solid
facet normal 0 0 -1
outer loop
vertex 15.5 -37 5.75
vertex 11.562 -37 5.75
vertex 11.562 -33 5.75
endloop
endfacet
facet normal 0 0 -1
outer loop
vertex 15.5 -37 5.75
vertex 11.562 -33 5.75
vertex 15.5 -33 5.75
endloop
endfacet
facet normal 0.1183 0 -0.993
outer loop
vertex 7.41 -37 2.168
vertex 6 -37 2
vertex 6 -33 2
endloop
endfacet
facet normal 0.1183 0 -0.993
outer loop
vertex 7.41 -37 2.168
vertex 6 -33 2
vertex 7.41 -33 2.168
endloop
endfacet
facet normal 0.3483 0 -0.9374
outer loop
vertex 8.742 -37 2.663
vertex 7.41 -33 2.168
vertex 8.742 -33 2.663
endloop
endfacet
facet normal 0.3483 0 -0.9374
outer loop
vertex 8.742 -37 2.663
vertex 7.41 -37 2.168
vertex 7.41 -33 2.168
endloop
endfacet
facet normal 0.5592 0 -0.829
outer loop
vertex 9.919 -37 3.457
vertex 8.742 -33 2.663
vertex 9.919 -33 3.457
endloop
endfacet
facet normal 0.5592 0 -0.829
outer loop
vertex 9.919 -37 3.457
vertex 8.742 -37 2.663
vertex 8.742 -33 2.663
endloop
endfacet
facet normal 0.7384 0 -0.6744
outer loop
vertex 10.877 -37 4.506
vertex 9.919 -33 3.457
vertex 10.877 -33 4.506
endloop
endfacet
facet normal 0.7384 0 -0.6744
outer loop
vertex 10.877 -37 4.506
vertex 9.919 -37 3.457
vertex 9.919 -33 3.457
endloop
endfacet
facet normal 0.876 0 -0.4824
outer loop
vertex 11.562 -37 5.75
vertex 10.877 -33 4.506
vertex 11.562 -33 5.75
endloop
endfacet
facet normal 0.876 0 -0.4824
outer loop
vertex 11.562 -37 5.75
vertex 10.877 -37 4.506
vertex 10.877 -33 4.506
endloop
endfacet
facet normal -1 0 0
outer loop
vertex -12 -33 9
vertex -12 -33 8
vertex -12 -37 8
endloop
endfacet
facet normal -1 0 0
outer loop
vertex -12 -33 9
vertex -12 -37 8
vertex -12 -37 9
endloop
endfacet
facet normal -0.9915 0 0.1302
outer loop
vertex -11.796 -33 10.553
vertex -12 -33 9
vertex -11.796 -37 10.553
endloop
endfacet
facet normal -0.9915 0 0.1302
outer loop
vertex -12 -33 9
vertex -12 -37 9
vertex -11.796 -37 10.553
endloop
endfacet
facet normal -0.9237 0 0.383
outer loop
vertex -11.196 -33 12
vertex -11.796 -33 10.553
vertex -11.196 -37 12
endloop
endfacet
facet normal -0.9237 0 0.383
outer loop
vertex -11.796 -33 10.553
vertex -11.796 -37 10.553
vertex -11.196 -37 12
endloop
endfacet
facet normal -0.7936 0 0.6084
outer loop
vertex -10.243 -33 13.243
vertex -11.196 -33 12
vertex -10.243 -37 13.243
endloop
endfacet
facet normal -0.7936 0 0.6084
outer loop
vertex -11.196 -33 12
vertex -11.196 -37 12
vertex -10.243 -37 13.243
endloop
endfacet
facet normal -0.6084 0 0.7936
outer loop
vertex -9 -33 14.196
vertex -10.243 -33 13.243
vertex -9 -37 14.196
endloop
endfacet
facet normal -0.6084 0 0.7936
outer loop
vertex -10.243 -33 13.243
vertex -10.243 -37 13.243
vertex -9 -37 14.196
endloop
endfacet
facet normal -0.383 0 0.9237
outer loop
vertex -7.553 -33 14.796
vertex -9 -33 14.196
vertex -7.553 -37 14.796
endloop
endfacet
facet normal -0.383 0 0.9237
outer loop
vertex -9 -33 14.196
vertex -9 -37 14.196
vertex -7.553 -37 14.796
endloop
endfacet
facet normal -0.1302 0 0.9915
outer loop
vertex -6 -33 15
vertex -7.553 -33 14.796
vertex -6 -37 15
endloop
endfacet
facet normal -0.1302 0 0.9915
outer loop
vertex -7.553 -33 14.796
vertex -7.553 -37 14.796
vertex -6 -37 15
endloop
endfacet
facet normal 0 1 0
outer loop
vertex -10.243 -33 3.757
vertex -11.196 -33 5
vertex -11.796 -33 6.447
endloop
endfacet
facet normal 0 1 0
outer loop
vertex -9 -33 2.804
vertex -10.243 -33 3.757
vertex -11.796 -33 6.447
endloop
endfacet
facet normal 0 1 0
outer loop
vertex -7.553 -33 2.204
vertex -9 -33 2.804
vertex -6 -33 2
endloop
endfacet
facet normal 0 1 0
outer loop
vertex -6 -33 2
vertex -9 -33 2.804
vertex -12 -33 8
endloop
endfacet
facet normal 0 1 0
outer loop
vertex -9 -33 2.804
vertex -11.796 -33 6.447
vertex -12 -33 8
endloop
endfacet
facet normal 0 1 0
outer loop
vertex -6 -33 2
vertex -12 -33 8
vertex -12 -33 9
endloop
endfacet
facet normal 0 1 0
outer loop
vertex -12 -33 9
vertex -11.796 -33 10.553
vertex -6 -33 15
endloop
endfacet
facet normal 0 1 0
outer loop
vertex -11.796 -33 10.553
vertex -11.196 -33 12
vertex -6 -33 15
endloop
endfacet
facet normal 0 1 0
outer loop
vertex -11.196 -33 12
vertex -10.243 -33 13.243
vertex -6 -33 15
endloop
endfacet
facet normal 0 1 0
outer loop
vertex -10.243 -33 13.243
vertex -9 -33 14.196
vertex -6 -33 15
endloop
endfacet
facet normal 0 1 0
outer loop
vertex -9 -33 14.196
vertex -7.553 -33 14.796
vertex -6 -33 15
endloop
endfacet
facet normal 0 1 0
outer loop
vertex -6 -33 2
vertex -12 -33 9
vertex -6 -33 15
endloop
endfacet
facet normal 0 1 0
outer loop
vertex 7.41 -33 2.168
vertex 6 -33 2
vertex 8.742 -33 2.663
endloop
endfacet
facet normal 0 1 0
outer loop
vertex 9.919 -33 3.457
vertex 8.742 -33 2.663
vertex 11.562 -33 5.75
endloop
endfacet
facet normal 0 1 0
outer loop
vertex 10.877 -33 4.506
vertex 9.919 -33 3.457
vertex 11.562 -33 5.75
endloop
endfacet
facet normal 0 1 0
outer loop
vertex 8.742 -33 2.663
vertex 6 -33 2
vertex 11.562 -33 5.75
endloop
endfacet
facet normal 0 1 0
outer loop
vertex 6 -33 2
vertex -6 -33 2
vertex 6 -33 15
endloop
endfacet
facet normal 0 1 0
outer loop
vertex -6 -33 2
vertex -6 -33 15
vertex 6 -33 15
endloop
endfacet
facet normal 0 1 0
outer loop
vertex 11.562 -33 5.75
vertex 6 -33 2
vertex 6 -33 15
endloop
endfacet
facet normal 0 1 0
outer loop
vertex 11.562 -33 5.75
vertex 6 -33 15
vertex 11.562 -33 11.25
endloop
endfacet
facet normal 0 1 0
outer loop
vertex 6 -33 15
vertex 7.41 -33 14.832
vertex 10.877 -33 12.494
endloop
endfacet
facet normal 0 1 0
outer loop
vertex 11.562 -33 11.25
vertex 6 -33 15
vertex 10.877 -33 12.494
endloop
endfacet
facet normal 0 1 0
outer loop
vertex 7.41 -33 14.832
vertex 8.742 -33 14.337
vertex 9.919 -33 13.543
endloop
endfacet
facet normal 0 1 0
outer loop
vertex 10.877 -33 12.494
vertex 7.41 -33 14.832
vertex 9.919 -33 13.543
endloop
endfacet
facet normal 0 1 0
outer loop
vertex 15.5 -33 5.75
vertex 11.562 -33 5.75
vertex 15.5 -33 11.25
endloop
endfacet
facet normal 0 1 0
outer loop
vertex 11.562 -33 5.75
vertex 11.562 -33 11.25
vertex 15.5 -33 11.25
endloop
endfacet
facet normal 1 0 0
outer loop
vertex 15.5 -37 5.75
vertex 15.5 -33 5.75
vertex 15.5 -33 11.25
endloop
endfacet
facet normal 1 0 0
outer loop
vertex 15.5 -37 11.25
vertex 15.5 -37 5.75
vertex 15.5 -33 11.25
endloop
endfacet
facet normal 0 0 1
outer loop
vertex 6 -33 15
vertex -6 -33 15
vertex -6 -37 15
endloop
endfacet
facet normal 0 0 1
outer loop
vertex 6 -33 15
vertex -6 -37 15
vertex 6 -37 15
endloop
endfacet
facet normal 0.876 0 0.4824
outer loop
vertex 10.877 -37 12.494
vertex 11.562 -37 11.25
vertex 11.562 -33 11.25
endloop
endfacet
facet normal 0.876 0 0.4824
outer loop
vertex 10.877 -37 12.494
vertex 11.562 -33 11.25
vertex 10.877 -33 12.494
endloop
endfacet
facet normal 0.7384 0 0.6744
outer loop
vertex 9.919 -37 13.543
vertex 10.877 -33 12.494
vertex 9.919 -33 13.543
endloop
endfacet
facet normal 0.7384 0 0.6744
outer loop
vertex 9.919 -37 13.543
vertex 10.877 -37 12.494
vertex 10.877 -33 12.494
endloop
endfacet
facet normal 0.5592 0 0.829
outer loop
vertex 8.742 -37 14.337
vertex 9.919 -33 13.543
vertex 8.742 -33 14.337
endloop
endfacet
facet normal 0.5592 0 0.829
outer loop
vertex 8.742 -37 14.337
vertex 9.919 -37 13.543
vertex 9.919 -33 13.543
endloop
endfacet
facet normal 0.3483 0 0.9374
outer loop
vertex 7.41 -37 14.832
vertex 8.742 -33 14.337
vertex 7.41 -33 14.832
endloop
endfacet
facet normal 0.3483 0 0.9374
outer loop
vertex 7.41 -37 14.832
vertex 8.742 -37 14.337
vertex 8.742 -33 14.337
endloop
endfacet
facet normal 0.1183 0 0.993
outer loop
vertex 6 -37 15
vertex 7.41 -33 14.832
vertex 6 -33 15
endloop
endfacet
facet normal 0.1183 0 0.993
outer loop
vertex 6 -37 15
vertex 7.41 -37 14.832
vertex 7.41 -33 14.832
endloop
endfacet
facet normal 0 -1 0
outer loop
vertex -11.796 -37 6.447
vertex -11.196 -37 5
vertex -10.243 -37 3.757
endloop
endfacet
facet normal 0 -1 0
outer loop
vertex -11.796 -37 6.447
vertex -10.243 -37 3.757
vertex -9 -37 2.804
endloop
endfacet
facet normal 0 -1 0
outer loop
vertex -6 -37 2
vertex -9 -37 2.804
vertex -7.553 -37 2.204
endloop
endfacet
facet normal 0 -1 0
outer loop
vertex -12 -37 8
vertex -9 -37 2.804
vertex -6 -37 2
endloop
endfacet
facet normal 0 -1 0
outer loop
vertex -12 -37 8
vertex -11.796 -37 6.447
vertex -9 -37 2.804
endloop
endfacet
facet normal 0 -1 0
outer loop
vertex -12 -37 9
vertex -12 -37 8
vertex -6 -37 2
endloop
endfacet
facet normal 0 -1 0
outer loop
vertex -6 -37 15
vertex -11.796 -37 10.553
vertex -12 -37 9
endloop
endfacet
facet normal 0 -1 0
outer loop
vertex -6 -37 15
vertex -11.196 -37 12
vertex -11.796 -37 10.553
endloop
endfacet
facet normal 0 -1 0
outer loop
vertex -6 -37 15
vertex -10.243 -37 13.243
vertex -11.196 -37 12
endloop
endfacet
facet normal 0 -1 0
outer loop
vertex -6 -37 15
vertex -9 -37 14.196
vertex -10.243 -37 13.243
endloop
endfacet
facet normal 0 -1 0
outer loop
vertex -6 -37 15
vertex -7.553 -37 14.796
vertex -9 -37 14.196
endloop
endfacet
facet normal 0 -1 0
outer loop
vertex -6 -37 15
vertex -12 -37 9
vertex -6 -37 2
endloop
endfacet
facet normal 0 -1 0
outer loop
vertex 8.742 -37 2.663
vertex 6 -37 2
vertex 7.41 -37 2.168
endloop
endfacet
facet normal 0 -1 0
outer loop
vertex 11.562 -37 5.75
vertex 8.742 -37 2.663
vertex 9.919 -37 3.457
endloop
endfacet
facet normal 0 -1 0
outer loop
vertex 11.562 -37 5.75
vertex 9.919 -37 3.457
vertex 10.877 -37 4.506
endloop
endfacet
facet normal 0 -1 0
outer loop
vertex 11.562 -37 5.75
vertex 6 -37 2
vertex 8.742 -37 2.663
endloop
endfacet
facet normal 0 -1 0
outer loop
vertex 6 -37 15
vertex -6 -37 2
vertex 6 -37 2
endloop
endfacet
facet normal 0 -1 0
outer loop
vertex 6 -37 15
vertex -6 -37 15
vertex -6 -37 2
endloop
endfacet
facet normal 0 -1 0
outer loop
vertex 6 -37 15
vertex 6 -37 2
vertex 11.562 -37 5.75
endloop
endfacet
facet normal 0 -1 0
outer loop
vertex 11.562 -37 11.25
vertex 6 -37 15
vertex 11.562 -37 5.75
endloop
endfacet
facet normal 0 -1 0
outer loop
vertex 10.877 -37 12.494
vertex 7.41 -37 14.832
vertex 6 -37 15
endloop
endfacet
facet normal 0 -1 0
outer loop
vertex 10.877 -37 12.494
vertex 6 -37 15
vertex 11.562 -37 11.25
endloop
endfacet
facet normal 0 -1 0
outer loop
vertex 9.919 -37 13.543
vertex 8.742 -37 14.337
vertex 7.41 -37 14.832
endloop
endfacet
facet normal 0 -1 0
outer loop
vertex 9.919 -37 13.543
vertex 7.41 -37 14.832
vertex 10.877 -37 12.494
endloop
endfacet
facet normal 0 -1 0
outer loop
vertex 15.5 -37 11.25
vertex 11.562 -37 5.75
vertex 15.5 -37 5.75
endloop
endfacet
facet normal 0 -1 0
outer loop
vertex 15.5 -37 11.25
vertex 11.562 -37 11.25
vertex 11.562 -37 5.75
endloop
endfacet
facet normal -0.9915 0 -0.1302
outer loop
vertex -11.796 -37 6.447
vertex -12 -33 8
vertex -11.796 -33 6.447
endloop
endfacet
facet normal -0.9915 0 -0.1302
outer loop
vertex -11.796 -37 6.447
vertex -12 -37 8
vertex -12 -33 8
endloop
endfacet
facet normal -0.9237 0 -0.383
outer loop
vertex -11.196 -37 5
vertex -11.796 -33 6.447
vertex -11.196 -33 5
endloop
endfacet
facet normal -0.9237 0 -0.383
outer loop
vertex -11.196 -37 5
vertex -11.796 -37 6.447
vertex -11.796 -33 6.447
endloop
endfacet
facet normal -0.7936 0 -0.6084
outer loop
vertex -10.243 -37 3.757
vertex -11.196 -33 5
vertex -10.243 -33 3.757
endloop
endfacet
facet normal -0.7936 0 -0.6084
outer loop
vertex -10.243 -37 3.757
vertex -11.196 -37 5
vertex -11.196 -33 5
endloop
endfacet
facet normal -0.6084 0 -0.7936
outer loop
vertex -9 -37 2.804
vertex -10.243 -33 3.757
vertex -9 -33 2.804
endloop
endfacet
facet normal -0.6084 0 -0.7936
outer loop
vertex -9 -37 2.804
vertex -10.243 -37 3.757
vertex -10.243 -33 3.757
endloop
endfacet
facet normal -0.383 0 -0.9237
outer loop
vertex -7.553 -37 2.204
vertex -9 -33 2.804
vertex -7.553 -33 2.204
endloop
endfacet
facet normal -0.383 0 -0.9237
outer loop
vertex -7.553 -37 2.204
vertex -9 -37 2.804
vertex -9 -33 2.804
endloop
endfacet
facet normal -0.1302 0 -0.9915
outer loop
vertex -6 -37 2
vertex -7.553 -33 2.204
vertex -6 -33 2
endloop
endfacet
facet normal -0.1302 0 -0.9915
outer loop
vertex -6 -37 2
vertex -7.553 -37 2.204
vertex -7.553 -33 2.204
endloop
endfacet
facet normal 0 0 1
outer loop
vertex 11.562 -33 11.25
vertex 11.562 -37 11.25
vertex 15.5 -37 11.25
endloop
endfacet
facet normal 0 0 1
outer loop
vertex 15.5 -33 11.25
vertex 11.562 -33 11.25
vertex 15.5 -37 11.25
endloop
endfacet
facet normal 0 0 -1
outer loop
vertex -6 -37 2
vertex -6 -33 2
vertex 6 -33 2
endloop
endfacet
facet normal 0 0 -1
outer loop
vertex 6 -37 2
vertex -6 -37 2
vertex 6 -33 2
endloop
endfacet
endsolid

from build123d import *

# Parameters (mm, degrees)
SKETCH009_W  = 24
SKETCH009_H  = 13
PAD005_DEPTH = 4
FILLET001_R  = 6
SKETCH010_W  = 5.5
SKETCH010_H  = 5.5
PAD006_DEPTH = 4


with BuildPart() as part:
    # Sketch009 (on DatumPlane) → Pad005 (new body)
    with BuildSketch(Plane.XZ.offset(33)):
        with Locations((0, 8.5)):
            Rectangle(SKETCH009_W, SKETCH009_H)
    extrude(amount=PAD005_DEPTH)

    # Fillet001
    fillet001_edges = [part.edges().sort_by_distance(p)[0] for p in [
        (-12, -35, 15),
        (12, -35, 15),
        (-12, -35, 2),
        (12, -35, 2),
    ]]
    fillet(fillet001_edges, radius=FILLET001_R)

    # Sketch010 (on DatumPlane) → Pad006 (join)
    with BuildSketch(Plane.XZ.offset(33)):
        with Locations((12.75, 8.5)):
            Rectangle(SKETCH010_W, SKETCH010_H)
    extrude(amount=PAD006_DEPTH)


solid = part.part
